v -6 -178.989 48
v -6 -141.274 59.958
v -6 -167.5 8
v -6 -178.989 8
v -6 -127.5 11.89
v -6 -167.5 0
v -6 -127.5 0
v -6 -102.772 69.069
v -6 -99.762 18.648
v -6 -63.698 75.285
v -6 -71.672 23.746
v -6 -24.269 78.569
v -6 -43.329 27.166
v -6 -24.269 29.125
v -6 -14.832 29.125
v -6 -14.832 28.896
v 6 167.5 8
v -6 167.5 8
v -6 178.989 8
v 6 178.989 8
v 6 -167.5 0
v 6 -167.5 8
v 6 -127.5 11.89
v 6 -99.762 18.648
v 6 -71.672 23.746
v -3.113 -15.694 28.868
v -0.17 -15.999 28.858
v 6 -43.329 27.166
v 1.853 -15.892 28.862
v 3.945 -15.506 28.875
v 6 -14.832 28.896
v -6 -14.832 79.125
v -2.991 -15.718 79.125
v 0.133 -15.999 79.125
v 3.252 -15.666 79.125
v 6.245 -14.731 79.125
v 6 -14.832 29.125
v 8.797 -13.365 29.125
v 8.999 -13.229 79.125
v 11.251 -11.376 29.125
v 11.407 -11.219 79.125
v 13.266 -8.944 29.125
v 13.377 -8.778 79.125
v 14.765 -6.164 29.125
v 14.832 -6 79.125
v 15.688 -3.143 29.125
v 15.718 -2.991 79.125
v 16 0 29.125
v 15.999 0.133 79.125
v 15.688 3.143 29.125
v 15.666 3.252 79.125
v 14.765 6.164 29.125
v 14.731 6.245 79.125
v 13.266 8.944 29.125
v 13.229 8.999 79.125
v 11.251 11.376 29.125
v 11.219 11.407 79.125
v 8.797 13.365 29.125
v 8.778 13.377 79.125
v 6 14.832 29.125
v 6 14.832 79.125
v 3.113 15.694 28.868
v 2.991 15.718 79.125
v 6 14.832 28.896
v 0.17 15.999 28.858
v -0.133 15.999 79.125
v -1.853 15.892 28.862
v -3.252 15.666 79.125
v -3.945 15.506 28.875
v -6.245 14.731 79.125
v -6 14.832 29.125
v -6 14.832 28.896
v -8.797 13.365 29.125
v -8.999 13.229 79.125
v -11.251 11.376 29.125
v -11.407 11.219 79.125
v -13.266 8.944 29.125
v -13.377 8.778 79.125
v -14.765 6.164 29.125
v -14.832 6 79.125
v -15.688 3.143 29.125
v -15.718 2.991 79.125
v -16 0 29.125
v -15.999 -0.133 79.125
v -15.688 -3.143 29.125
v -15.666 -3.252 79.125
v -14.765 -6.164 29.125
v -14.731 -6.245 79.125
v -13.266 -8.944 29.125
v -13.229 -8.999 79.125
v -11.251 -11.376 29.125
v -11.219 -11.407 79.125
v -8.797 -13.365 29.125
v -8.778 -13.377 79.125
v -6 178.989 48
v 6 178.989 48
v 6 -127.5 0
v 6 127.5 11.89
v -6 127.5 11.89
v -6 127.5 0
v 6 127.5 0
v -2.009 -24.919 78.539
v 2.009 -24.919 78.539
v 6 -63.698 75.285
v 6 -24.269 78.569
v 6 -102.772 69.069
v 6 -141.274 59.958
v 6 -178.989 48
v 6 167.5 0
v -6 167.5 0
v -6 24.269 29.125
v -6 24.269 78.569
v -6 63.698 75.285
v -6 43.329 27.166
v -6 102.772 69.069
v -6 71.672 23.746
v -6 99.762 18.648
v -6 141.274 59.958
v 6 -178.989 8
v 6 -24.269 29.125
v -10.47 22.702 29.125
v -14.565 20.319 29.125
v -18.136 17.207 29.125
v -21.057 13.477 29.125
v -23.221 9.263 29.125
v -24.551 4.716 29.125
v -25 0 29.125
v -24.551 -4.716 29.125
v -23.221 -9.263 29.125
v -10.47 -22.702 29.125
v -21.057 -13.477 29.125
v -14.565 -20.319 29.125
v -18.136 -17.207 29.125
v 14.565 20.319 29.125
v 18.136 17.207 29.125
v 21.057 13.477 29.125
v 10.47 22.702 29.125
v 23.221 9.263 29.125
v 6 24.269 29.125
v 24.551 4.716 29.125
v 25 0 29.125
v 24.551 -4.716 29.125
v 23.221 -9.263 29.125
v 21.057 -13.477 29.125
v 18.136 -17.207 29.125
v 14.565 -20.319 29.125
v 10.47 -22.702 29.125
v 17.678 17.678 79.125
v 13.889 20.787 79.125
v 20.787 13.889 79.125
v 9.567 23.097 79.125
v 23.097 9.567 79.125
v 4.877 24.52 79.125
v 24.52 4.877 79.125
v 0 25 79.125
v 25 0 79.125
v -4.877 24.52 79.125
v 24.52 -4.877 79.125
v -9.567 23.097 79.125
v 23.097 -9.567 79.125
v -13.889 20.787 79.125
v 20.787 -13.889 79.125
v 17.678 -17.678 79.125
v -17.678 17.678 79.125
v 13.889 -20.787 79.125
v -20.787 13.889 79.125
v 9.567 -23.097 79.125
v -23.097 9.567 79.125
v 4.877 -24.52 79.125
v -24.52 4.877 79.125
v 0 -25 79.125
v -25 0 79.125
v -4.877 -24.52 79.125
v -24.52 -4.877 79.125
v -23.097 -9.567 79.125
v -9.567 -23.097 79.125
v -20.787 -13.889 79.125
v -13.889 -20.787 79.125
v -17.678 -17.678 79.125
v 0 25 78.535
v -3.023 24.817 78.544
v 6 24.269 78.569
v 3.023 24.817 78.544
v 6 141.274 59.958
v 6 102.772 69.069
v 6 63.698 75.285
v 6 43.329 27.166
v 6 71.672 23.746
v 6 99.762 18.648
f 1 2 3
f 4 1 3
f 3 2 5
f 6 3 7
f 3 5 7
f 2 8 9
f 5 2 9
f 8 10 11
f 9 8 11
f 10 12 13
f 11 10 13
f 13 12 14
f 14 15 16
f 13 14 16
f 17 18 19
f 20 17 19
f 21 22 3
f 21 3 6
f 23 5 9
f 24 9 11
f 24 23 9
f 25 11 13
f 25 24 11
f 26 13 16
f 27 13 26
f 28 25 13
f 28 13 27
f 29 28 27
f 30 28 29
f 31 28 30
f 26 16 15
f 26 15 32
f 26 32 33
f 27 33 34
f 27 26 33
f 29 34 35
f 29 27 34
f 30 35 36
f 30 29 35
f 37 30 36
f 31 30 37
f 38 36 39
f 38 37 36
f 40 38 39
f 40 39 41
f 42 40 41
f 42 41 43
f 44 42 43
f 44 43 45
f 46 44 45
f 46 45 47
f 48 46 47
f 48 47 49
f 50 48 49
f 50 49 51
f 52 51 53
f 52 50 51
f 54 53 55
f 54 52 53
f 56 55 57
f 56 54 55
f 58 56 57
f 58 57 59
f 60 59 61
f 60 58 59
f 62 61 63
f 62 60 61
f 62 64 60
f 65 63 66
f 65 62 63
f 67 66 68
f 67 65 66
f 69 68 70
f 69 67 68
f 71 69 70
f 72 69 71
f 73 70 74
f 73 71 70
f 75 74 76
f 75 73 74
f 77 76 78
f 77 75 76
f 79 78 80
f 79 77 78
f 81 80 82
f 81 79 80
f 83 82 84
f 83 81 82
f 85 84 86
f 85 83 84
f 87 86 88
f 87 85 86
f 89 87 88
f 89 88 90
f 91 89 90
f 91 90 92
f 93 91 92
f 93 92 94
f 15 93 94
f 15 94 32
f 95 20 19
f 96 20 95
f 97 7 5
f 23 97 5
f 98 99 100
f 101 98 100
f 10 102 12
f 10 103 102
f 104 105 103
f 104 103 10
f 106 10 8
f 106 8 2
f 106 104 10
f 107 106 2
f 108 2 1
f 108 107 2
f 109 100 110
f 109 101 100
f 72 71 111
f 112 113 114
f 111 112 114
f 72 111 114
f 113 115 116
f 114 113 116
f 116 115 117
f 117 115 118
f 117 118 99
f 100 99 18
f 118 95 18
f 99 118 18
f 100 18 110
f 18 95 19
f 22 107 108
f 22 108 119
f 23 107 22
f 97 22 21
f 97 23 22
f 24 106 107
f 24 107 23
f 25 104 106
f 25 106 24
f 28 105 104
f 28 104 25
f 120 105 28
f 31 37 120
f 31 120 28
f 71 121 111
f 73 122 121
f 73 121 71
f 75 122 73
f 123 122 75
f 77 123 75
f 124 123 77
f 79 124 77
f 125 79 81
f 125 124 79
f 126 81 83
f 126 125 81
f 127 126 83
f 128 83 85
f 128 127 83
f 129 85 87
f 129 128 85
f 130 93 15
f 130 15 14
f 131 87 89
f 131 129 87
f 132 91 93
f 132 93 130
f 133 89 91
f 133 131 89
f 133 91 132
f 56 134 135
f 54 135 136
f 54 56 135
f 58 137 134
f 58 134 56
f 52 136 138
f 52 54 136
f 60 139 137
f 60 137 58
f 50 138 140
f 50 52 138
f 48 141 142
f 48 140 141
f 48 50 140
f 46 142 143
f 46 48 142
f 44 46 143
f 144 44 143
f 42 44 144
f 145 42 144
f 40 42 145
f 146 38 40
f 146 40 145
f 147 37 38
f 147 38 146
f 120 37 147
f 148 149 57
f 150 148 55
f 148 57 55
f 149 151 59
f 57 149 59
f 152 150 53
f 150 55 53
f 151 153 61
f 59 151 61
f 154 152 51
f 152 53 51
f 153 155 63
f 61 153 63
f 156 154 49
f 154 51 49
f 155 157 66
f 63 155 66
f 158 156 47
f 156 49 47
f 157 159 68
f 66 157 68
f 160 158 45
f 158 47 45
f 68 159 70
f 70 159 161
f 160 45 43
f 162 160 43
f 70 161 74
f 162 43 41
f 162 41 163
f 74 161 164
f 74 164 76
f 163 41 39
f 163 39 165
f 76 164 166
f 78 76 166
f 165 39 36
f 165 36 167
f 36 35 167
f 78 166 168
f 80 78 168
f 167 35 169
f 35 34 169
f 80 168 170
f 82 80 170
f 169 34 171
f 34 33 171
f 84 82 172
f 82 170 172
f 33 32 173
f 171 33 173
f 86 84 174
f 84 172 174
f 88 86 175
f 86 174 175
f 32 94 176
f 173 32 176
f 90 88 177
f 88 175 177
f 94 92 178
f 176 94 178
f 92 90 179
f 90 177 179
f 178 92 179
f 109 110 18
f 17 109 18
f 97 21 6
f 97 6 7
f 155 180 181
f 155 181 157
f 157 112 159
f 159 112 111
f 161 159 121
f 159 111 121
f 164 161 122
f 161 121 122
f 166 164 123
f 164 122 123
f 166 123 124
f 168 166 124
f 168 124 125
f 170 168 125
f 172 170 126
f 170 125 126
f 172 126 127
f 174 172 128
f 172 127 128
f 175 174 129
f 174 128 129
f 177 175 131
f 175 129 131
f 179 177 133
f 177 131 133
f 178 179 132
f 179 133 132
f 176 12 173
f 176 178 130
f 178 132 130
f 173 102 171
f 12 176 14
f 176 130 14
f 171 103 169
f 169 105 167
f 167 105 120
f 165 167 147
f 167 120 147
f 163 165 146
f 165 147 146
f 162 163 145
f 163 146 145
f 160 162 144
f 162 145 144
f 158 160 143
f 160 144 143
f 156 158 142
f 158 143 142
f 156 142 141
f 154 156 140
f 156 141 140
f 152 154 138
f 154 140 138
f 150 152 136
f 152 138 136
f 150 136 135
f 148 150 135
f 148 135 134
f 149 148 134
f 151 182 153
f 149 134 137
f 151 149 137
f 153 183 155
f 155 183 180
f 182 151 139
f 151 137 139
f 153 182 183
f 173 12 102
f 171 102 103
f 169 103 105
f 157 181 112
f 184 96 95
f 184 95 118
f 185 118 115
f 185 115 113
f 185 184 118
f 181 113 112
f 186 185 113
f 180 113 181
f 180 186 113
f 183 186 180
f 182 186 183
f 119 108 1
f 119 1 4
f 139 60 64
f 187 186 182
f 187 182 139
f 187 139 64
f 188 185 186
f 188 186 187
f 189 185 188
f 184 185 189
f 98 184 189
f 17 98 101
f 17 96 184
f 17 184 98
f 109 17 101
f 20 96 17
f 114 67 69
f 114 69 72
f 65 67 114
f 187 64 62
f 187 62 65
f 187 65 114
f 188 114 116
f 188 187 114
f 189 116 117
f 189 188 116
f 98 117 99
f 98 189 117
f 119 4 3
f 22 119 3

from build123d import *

# Parameters (mm, degrees)
BOSS_EXTRUDE1_DEPTH = 6
SKETCH2_W           = 50
SKETCH2_H           = 25
SKETCH3_R           = 16
CUT_EXTRUDE1_DEPTH  = 198.288440507


with BuildPart() as part:
    # Sketch1 → Boss-Extrude1 (new, symmetric)
    with BuildSketch(Plane(origin=(0, 0, 0), x_dir=(0, 0, -1), z_dir=(1, 0, 0))):
        with BuildLine():
            Line((0, 167.5), (-8, 167.5))
            Line((-8, 167.5), (-8, 178.988731807))
            Line((-8, 178.988731807), (-48, 178.988731807))
            ThreePointArc((-48, 178.988731807), (-79.124980803, 0), (-48, -178.988731807))
            Line((-48, -178.988731807), (-8, -178.988731807))
            Line((-8, -178.988731807), (-8, -167.5))
            Line((-8, -167.5), (0, -167.5))
            Line((0, -167.5), (0, -127.5))
            Line((0, -127.5), (-11.889594458, -127.5))
            ThreePointArc((-11.889594458, -127.5), (-29.124980803, 0), (-11.889594458, 127.5))
            Line((-11.889594458, 127.5), (0, 127.5))
            Line((0, 127.5), (0, 167.5))
        make_face()
    extrude(amount=BOSS_EXTRUDE1_DEPTH, both=True)

    # Sketch2 → Revolve1 (revolve)
    with BuildSketch(Plane(origin=(0, 0, 0), x_dir=(0, 0, -1), z_dir=(1, 0, 0))):
        with Locations((-54.124980803, 12.5)):
            Rectangle(SKETCH2_W, SKETCH2_H)
    revolve(axis=Axis((0, 0, 29.124980803), (0, 0, 1)))

    # Sketch3 → Cut-Extrude1 (cut, through all)
    with BuildSketch(Plane.XY):
        with Locations(Location((0, 0, 0), (0, 0, 247.975687163))):
            Circle(SKETCH3_R)
    extrude(amount=CUT_EXTRUDE1_DEPTH, mode=Mode.SUBTRACT)


solid = part.part
